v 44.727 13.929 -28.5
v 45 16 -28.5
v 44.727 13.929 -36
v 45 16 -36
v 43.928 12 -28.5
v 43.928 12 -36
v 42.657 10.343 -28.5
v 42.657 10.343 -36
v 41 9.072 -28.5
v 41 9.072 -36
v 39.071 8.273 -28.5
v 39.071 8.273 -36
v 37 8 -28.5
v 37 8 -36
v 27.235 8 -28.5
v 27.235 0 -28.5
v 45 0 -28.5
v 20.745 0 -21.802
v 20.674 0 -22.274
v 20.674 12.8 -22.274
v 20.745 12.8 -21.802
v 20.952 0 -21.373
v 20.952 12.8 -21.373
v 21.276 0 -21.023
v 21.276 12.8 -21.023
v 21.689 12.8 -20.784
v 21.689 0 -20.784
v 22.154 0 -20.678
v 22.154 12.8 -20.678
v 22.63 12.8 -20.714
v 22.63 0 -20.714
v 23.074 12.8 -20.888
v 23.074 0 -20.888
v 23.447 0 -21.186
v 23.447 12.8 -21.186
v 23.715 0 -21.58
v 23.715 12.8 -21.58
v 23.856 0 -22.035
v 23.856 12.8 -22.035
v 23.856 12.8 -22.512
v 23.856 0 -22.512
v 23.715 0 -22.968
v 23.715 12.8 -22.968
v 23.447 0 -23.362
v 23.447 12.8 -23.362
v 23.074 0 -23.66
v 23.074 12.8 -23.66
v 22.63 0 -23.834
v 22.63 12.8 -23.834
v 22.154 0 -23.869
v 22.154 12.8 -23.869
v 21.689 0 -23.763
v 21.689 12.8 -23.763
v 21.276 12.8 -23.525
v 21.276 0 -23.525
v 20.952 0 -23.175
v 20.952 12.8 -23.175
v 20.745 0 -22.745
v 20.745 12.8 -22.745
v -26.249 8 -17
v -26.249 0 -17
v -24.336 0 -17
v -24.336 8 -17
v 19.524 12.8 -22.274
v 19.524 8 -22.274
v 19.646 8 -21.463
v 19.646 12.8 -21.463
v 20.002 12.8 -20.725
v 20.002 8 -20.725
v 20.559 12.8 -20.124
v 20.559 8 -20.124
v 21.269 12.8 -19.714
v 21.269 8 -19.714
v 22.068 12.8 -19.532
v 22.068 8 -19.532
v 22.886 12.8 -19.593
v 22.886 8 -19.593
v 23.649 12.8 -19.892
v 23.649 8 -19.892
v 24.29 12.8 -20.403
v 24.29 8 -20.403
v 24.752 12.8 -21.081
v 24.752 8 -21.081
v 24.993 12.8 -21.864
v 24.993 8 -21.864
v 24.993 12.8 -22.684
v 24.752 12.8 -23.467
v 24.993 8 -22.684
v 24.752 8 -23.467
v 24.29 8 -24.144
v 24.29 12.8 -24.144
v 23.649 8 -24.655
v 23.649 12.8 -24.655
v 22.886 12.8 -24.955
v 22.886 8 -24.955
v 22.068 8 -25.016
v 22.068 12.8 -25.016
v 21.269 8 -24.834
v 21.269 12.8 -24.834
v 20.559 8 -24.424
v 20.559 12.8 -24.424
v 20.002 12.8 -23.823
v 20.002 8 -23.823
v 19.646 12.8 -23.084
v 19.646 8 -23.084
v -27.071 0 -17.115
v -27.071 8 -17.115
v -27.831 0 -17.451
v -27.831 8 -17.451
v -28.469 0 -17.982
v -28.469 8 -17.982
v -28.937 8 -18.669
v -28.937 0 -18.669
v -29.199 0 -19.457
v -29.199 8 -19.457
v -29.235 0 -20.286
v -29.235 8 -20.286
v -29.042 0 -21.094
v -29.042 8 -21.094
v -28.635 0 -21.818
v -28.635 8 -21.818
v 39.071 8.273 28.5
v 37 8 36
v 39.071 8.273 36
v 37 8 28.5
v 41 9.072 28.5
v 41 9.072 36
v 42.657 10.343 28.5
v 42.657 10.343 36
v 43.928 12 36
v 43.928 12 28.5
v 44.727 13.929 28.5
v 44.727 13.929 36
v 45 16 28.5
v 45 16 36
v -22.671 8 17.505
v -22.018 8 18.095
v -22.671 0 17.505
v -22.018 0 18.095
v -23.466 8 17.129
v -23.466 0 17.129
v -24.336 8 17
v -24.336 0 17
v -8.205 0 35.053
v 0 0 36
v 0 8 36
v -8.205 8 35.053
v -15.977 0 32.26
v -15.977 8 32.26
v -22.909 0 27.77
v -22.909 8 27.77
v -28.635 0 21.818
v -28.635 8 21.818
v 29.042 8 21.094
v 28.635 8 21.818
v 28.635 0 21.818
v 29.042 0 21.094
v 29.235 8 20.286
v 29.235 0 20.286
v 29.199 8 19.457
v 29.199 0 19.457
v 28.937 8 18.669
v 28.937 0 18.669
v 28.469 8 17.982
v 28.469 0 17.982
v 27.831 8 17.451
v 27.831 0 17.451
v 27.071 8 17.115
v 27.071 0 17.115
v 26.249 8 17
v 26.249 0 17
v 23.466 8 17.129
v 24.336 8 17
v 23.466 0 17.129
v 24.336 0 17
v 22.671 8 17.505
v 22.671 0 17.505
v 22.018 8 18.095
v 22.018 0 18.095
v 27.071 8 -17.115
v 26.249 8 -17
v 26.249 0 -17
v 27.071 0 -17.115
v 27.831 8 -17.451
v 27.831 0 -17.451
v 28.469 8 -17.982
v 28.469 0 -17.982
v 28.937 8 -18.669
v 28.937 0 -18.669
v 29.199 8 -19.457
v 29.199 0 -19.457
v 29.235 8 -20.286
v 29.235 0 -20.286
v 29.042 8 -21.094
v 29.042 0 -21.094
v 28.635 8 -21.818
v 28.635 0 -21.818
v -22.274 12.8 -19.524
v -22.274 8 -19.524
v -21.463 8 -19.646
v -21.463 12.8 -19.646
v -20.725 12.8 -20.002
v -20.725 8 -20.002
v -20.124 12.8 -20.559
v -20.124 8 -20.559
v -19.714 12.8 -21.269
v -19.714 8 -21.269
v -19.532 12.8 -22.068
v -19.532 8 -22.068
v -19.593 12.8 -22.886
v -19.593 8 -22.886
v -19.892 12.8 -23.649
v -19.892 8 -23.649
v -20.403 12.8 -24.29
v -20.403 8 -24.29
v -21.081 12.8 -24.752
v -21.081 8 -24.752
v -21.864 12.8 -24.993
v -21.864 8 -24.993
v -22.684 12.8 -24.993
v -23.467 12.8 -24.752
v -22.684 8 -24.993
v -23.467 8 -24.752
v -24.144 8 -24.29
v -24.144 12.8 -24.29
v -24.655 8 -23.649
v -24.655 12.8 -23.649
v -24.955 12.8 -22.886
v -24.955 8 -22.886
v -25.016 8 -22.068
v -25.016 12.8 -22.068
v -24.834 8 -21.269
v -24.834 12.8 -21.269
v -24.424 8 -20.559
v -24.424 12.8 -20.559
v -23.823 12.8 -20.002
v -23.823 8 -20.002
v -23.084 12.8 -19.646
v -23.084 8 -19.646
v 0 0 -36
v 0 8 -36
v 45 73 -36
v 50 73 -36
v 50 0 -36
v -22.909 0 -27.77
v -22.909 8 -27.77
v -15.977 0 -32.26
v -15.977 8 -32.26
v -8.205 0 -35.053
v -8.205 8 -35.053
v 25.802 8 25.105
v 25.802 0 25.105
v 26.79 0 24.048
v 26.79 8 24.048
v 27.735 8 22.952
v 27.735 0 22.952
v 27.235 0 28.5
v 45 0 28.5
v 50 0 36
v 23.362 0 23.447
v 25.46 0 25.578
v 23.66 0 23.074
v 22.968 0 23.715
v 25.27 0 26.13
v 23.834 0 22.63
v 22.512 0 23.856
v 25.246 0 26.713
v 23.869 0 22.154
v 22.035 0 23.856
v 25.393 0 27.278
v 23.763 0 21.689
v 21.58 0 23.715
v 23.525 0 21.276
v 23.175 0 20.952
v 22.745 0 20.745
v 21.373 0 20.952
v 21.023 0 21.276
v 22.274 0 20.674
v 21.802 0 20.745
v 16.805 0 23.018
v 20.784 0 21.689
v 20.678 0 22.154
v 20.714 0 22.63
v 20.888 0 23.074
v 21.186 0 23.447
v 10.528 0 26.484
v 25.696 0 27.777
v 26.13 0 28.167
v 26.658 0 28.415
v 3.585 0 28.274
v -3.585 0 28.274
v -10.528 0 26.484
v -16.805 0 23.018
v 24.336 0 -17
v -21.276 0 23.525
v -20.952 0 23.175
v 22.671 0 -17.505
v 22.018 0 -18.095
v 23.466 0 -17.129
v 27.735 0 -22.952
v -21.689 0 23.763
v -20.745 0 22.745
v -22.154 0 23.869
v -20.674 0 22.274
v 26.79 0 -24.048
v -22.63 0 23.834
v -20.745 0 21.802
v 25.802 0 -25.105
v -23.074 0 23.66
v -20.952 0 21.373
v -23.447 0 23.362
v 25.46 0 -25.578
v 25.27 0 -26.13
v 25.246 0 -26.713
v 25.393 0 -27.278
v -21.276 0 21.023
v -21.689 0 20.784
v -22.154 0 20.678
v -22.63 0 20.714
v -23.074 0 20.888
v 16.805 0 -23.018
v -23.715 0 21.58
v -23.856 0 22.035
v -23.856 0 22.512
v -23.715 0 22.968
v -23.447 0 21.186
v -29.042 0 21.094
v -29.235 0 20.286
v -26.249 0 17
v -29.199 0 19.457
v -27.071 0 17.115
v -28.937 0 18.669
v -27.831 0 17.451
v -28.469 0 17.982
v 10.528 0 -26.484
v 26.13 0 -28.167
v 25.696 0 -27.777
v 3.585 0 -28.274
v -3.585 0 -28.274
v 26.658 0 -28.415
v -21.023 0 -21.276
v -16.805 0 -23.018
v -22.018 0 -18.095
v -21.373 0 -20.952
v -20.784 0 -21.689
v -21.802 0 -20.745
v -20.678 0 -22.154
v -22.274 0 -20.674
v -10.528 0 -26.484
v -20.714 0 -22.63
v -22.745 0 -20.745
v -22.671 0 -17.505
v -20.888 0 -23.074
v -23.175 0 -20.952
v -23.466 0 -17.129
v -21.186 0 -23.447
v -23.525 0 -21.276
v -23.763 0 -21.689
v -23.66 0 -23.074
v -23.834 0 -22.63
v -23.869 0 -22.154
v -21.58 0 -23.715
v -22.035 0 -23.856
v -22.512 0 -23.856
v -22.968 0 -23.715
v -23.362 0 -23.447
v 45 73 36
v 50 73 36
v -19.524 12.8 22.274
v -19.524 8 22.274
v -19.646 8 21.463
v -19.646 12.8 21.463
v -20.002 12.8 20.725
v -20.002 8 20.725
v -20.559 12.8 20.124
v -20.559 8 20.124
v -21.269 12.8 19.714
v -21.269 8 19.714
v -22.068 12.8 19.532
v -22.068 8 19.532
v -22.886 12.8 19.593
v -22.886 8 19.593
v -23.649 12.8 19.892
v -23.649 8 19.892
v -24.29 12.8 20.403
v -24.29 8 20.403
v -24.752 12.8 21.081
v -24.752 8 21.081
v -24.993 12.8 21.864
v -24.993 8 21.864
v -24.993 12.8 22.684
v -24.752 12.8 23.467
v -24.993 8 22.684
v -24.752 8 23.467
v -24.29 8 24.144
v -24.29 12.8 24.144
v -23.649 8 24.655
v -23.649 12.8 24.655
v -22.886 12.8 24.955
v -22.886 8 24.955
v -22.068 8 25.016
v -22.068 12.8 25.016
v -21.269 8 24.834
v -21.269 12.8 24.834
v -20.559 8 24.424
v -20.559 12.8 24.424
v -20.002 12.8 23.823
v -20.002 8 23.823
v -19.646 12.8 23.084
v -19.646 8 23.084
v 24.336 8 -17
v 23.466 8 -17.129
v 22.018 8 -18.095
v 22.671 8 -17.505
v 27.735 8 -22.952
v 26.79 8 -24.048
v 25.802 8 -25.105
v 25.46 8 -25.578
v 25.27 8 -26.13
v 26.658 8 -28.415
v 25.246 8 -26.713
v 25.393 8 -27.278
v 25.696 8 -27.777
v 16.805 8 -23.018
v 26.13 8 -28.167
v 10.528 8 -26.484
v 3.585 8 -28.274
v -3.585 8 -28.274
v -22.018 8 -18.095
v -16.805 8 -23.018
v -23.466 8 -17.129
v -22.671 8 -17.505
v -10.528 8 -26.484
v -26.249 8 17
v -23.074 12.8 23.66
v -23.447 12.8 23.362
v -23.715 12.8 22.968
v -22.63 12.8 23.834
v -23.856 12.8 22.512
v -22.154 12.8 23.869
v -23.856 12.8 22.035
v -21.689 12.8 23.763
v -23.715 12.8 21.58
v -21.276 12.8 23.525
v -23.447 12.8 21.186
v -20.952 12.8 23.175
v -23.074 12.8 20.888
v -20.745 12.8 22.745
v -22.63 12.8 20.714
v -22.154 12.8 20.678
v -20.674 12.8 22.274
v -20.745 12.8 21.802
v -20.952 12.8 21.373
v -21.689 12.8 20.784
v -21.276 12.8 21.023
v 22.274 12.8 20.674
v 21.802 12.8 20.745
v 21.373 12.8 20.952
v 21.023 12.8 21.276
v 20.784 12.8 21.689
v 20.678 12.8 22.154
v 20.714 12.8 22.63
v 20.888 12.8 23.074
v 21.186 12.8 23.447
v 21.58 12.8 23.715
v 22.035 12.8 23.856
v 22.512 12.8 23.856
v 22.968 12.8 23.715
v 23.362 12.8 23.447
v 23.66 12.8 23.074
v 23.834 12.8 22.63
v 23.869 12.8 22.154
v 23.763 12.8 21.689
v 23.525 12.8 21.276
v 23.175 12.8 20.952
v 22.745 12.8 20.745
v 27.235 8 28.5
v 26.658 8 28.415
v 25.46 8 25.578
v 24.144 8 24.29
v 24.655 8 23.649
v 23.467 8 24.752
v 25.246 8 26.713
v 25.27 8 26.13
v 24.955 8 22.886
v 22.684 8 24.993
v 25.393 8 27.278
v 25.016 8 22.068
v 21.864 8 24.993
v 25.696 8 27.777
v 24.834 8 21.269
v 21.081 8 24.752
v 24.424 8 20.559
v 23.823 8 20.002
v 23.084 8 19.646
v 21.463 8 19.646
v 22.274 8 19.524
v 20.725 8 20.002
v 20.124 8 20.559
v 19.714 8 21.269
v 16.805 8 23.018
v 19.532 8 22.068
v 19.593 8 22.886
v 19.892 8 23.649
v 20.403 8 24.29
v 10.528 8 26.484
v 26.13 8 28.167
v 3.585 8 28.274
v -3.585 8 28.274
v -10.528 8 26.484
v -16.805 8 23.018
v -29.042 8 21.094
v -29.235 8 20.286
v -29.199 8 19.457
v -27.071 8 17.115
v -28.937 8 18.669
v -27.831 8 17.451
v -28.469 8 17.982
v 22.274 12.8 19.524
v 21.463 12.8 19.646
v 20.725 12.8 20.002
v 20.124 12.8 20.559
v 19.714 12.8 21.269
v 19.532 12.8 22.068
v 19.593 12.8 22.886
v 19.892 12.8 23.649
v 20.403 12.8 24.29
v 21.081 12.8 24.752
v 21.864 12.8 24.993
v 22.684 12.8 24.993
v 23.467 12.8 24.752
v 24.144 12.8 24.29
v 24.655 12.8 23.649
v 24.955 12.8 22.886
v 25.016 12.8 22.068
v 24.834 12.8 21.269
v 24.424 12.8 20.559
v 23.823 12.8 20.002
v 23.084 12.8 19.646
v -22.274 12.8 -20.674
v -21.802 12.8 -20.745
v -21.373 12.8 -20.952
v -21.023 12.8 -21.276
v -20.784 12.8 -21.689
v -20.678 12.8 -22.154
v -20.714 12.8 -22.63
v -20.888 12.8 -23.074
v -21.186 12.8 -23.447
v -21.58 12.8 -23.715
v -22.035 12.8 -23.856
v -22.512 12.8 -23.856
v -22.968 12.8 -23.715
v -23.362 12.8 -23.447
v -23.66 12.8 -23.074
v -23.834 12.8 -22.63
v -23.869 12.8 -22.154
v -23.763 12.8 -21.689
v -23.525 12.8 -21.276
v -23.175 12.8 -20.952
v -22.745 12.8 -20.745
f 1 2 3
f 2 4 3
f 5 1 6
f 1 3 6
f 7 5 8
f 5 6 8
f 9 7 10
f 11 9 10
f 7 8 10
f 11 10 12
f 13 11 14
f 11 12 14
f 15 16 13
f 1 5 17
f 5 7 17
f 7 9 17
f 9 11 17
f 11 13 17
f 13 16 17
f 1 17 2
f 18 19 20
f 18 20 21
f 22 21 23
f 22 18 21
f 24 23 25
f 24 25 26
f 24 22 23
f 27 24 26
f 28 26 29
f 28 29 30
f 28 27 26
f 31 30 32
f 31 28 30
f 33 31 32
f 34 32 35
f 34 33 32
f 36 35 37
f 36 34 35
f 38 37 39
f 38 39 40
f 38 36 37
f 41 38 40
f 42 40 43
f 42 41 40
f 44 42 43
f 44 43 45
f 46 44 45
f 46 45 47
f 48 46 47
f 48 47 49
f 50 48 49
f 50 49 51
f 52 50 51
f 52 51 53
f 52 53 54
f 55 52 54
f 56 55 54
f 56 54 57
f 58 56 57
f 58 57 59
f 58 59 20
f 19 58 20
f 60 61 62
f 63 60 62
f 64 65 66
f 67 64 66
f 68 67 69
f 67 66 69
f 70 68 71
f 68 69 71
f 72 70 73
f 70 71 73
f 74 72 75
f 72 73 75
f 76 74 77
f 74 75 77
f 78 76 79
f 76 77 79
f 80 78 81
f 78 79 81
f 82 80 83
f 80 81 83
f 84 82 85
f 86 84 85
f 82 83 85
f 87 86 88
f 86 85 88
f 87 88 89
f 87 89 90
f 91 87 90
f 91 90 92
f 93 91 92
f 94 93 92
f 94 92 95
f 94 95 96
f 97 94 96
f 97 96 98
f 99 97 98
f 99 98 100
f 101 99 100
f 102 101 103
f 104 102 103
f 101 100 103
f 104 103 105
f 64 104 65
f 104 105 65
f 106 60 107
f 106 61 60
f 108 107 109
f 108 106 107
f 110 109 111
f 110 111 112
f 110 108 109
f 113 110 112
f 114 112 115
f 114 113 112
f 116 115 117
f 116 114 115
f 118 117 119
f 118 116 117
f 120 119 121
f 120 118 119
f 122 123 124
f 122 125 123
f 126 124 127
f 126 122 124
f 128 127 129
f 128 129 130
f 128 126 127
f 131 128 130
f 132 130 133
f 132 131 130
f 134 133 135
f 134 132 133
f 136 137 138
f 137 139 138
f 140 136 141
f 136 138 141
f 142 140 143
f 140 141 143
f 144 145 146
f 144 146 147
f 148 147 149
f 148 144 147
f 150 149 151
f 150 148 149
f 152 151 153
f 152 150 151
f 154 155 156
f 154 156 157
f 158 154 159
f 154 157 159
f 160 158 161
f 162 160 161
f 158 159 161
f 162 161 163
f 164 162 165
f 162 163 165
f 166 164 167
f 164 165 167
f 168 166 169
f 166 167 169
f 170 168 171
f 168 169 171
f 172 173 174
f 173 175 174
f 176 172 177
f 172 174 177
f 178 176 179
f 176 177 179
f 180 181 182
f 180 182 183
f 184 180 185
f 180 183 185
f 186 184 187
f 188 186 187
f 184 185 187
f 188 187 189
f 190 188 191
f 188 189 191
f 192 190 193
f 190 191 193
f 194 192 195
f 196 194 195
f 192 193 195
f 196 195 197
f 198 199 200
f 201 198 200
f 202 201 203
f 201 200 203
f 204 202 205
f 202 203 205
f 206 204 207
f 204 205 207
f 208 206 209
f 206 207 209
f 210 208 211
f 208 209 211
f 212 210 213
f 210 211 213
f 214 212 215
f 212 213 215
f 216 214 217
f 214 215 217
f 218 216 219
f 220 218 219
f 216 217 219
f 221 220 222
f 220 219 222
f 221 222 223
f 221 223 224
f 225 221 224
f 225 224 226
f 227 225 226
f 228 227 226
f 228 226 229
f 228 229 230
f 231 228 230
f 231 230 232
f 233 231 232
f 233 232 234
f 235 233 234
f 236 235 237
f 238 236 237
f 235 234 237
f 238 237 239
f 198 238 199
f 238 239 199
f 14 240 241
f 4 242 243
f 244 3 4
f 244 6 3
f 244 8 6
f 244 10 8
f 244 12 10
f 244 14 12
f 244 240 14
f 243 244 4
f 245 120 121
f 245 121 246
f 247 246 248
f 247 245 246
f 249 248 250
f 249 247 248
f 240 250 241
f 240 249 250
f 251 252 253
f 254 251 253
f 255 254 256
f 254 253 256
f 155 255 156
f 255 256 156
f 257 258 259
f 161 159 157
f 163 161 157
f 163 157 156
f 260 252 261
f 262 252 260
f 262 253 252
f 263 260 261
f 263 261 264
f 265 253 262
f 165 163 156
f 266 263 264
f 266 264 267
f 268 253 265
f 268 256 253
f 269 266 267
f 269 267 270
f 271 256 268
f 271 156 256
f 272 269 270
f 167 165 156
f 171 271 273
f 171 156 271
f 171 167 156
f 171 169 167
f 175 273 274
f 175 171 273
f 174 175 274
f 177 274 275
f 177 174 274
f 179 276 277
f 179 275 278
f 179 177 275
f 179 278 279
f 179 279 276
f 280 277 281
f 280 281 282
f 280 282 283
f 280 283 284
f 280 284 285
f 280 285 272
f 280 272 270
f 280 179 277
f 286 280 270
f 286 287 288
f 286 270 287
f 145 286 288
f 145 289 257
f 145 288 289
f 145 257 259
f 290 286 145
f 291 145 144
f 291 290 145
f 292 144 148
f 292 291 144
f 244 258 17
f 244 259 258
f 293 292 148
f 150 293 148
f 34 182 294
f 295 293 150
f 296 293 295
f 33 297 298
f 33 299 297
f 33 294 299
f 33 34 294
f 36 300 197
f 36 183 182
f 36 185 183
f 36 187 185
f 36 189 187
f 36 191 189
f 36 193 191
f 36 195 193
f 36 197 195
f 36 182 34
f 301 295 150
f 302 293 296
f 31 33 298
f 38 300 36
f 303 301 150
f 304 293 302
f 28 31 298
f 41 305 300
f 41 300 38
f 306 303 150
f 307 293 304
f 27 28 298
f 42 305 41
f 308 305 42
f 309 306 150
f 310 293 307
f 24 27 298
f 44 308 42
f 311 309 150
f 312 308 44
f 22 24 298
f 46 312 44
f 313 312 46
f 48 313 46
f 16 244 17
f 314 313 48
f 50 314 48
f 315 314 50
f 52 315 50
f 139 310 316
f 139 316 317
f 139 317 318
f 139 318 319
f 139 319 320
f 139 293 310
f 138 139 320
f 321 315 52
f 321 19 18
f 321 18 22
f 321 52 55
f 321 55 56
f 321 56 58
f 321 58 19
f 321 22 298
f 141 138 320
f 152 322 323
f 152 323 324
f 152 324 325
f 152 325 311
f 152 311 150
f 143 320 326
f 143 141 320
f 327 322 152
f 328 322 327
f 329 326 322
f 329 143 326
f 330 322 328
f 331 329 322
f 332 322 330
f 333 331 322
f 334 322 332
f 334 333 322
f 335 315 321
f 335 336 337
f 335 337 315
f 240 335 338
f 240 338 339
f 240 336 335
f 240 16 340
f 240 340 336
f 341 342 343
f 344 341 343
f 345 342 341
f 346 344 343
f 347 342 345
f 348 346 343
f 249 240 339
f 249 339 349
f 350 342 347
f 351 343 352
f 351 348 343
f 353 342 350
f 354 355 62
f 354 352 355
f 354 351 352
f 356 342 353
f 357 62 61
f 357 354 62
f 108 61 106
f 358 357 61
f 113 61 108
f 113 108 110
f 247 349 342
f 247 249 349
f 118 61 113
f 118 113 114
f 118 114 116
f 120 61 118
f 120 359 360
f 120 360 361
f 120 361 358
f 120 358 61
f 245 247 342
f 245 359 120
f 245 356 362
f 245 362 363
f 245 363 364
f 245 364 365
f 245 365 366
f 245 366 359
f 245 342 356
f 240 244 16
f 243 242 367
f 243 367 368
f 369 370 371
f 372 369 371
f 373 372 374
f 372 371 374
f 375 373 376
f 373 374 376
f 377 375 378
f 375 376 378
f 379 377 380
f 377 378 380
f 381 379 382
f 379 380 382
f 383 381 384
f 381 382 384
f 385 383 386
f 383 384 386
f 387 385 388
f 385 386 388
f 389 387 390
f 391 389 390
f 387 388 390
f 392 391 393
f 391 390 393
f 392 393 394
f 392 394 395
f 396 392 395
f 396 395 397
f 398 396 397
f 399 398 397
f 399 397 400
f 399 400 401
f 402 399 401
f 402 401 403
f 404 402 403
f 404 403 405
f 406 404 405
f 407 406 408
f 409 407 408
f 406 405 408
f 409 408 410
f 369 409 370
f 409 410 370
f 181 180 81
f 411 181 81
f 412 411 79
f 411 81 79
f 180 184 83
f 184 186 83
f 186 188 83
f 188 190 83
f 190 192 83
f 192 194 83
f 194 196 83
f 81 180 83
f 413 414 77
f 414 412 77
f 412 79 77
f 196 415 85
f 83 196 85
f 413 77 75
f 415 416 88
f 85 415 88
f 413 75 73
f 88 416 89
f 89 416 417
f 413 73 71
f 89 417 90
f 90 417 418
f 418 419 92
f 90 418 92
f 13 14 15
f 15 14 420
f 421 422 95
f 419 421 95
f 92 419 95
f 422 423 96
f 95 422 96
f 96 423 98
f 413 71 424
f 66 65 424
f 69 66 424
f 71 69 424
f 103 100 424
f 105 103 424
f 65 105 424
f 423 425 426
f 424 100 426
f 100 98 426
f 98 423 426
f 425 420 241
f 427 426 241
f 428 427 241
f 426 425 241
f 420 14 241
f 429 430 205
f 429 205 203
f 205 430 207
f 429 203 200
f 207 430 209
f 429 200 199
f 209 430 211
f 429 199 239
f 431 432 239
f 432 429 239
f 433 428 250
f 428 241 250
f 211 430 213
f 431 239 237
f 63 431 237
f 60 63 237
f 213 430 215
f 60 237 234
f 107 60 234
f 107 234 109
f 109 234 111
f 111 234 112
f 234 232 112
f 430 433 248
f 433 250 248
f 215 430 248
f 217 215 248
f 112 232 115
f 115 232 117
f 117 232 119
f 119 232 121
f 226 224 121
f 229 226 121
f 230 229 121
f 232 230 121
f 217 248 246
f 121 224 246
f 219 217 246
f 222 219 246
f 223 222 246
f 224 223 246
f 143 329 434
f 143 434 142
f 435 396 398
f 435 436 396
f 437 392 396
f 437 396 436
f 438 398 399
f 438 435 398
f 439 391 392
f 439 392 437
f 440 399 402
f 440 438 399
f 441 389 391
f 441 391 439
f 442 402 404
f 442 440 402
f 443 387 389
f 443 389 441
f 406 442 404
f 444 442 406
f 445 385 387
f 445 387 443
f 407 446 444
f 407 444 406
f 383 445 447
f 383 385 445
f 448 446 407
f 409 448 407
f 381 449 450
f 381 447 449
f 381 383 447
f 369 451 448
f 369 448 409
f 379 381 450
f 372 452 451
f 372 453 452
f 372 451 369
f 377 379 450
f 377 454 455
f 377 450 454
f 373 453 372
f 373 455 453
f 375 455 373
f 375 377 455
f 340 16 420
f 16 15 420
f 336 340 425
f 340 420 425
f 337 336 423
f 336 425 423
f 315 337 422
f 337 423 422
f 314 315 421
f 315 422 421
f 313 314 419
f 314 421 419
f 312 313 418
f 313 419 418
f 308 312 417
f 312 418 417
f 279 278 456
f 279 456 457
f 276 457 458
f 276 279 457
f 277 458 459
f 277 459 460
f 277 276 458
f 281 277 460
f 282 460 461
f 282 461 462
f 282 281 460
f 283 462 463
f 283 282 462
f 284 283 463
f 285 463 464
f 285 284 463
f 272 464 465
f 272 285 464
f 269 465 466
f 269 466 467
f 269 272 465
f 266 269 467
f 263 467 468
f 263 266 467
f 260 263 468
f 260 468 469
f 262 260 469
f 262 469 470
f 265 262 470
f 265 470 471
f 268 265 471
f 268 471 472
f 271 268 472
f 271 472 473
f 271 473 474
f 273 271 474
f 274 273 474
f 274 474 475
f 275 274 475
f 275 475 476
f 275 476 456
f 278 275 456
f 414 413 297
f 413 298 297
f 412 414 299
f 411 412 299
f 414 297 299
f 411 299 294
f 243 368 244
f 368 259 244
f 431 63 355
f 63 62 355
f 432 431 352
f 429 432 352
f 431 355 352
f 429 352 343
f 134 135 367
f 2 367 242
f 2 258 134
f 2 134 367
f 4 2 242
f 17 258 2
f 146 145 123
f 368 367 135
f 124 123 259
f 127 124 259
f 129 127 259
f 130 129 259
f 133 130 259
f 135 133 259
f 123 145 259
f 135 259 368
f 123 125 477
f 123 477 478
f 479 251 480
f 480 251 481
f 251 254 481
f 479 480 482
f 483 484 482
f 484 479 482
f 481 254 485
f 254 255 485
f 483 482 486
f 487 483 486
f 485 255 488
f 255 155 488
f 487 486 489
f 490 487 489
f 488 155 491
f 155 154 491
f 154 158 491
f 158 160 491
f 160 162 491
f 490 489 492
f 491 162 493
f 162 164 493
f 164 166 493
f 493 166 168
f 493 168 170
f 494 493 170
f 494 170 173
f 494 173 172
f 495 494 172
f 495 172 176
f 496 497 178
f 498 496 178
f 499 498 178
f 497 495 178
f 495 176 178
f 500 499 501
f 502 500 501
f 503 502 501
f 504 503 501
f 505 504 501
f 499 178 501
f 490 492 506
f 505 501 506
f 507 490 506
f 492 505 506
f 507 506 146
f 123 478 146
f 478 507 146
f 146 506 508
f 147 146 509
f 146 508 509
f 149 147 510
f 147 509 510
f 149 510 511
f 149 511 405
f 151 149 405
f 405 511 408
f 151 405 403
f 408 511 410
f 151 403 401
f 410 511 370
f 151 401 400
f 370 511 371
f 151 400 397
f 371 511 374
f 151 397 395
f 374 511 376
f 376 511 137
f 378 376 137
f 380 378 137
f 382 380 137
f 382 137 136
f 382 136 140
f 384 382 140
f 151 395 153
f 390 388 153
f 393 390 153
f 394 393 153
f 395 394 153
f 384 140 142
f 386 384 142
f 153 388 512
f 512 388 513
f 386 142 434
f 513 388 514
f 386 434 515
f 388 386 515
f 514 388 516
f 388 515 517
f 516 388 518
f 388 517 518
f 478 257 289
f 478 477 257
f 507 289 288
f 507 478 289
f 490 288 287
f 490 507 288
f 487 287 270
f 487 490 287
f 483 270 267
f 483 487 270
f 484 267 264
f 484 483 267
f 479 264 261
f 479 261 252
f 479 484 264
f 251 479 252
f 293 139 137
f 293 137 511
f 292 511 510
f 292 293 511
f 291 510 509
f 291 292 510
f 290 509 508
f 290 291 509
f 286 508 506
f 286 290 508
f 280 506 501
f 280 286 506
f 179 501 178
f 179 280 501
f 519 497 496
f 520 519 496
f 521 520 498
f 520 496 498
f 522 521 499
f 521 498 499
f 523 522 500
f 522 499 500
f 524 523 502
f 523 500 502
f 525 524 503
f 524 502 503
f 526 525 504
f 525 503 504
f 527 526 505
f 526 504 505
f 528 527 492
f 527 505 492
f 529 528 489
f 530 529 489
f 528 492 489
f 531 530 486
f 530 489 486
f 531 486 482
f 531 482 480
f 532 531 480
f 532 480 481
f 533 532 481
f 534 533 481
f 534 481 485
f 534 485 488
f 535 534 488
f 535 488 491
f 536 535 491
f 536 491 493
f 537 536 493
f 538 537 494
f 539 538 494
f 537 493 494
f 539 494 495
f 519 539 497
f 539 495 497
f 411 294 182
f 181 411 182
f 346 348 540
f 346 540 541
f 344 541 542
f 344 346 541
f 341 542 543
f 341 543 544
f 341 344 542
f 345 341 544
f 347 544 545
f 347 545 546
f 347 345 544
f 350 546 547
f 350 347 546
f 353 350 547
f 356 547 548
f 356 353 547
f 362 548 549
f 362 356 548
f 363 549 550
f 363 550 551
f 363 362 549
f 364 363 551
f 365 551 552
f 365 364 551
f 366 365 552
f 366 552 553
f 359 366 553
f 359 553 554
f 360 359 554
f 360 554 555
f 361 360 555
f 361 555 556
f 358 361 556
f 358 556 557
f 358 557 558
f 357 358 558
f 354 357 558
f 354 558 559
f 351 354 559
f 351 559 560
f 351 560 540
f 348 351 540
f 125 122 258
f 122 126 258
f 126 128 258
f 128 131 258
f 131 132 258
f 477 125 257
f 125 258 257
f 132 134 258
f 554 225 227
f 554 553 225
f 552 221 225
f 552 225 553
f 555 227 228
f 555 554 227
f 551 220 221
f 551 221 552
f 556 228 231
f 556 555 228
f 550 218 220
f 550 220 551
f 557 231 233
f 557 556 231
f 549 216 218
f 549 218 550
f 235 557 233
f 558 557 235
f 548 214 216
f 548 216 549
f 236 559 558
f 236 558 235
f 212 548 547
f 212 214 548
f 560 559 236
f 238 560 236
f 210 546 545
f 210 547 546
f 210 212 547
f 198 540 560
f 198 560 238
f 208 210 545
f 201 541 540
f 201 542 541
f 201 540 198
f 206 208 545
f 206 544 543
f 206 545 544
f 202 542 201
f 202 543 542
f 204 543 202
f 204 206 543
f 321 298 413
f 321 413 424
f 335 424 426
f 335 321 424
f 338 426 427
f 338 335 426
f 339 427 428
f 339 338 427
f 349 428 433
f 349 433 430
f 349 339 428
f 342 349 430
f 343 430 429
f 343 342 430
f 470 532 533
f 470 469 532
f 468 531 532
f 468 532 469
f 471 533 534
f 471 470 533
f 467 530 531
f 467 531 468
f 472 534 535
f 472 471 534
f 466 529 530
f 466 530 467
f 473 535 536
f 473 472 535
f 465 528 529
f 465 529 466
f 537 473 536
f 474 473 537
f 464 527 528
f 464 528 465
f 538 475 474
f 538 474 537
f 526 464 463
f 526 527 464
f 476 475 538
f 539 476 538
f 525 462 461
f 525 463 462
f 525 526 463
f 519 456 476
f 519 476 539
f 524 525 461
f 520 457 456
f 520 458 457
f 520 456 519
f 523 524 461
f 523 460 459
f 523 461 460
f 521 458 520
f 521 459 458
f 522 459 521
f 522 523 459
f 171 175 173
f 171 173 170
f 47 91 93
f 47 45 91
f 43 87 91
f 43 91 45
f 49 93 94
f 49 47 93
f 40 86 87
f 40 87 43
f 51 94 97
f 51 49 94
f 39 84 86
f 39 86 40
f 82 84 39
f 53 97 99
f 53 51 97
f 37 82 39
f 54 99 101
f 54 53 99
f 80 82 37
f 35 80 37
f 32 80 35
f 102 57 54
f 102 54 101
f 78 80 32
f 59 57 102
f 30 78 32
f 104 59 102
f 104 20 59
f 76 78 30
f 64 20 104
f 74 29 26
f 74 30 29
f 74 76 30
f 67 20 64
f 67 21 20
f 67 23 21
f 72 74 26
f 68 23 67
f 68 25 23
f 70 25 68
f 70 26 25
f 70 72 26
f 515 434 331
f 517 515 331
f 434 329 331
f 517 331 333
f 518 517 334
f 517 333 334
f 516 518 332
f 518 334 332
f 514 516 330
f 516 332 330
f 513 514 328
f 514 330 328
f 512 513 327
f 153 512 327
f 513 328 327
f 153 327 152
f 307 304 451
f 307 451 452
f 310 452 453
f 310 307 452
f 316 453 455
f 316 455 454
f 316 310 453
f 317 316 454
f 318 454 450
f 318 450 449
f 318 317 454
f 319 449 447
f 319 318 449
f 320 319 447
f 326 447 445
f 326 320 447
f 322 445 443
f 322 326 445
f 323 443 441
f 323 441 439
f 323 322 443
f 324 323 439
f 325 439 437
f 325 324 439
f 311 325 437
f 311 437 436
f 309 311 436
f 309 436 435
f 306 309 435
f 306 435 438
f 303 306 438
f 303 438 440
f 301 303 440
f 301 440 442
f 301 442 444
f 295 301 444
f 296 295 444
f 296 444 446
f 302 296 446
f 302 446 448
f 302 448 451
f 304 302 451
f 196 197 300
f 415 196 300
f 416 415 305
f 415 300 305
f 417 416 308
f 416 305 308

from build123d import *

# Parameters (mm, degrees)
SKETCH1_R           = 28.5
BOSS_EXTRUDE2_DEPTH = 8
SKETCH3_R           = 2.75
SKETCH3_R_2         = 1.6
BOSS_EXTRUDE3_DEPTH = 4.8
CUT_EXTRUDE1_START  = -8
SKETCH4_R           = 1.6
CUT_EXTRUDE1_DEPTH  = 8
SKETCH5_W           = 5
SKETCH5_H           = 72
BOSS_EXTRUDE4_DEPTH = 65
CIRPATTERN1_COUNT   = 4
SKETCH7_W           = 84.689019003
SKETCH7_H           = 34
CUT_EXTRUDE2_DEPTH  = 8
FILLET2_R           = 3
FILLET3_R           = 2
FILLET4_R           = 8


with BuildPart() as part:
    # Sketch1 → Boss-Extrude2 (new body)
    with BuildSketch(Plane(origin=(0, 0, 0), x_dir=(1, 0, 0), z_dir=(0, 1, 0))):
        with BuildLine():
            Line((0, 36), (50, 36))
            Line((50, 36), (50, -36))
            Line((50, -36), (0, -36))
            ThreePointArc((0, -36), (-36, 0), (0, 36))
        make_face()
        with Locations(Location((0, 0, 0), (0, 0, 270))):
            Circle(SKETCH1_R, mode=Mode.SUBTRACT)
        with BuildLine():
            Line((21.994317448, 28.5), (45, 28.5))
            Line((45, 28.5), (45, -28.5))
            Line((45, -28.5), (21.994317448, -28.5))
            ThreePointArc((21.994317448, -28.5), (36, 0), (21.994317448, 28.5))
        make_face(mode=Mode.SUBTRACT)
    extrude(amount=BOSS_EXTRUDE2_DEPTH)

    # Sketch3 → Boss-Extrude3 (add)
    with BuildSketch(Plane(origin=(0, 8, 0), x_dir=(1, 0, 0), z_dir=(0, 1, 0))):
        with Locations(Location((-22.273863607, 22.273863607, 0), (0, 0, 270))):
            Circle(SKETCH3_R)
        with Locations(Location((-22.273863607, 22.273863607, 0), (0, 0, 270))):
            Circle(SKETCH3_R_2, mode=Mode.SUBTRACT)
    boss_extrude3 = extrude(amount=BOSS_EXTRUDE3_DEPTH)

    # Sketch4 → Cut-Extrude1 (cut)
    with BuildSketch(Plane(origin=(0, 8, 0), x_dir=(1, 0, 0), z_dir=(0, 1, 0)).offset(CUT_EXTRUDE1_START)):
        with Locations(Location((-22.273863607, 22.273863607, 0), (0, 0, 270))):
            Circle(SKETCH4_R)
    cut_extrude1 = extrude(amount=CUT_EXTRUDE1_DEPTH, mode=Mode.SUBTRACT)

    # Sketch5 → Boss-Extrude4 (add)
    with BuildSketch(Plane(origin=(0, 8, 0), x_dir=(1, 0, 0), z_dir=(0, 1, 0))):
        with Locations((47.5, 0)):
            Rectangle(SKETCH5_W, SKETCH5_H)
    extrude(amount=BOSS_EXTRUDE4_DEPTH)

    # CirPattern1: Boss-Extrude3, Cut-Extrude1 ×4 about axis
    cirpattern1_axis = Axis((0, 0, 0), (0, 1, 0))
    add([boss_extrude3.rotate(cirpattern1_axis, i * 360 / CIRPATTERN1_COUNT) for i in range(1, CIRPATTERN1_COUNT)])
    add([cut_extrude1.rotate(cirpattern1_axis, i * 360 / CIRPATTERN1_COUNT) for i in range(1, CIRPATTERN1_COUNT)], mode=Mode.SUBTRACT)

    # Sketch7 → Cut-Extrude2 (cut)
    with BuildSketch(Plane.XZ):
        with Locations((-4.710445778, 0)):
            Rectangle(SKETCH7_W, SKETCH7_H)
    extrude(amount=-CUT_EXTRUDE2_DEPTH, mode=Mode.SUBTRACT)

    # Fillet2
    fillet2_edges = [part.edges().sort_by_distance(p)[0] for p in [
        (22.874658467, 4, -17),
        (-31.733263305, 4, -17),
        (31.733263305, 4, -17),
        (-31.733263305, 4, 17),
        (31.733263305, 4, 17),
        (22.874658467, 4, 17),
        (-22.874658467, 4, 17),
        (-22.874658467, 4, -17),
    ]]
    fillet(fillet2_edges, radius=FILLET2_R)

    # Fillet3
    fillet3_edges = [part.edges().sort_by_distance(p)[0] for p in [
        (21.994317448, 4, -28.5),
        (21.994317448, 4, 28.5),
    ]]
    fillet(fillet3_edges, radius=FILLET3_R)

    # Fillet4
    fillet4_edges = [part.edges().sort_by_distance(p)[0] for p in [
        (45, 8, -32.25),
        (45, 8, 32.25),
    ]]
    fillet(fillet4_edges, radius=FILLET4_R)


solid = part.part
